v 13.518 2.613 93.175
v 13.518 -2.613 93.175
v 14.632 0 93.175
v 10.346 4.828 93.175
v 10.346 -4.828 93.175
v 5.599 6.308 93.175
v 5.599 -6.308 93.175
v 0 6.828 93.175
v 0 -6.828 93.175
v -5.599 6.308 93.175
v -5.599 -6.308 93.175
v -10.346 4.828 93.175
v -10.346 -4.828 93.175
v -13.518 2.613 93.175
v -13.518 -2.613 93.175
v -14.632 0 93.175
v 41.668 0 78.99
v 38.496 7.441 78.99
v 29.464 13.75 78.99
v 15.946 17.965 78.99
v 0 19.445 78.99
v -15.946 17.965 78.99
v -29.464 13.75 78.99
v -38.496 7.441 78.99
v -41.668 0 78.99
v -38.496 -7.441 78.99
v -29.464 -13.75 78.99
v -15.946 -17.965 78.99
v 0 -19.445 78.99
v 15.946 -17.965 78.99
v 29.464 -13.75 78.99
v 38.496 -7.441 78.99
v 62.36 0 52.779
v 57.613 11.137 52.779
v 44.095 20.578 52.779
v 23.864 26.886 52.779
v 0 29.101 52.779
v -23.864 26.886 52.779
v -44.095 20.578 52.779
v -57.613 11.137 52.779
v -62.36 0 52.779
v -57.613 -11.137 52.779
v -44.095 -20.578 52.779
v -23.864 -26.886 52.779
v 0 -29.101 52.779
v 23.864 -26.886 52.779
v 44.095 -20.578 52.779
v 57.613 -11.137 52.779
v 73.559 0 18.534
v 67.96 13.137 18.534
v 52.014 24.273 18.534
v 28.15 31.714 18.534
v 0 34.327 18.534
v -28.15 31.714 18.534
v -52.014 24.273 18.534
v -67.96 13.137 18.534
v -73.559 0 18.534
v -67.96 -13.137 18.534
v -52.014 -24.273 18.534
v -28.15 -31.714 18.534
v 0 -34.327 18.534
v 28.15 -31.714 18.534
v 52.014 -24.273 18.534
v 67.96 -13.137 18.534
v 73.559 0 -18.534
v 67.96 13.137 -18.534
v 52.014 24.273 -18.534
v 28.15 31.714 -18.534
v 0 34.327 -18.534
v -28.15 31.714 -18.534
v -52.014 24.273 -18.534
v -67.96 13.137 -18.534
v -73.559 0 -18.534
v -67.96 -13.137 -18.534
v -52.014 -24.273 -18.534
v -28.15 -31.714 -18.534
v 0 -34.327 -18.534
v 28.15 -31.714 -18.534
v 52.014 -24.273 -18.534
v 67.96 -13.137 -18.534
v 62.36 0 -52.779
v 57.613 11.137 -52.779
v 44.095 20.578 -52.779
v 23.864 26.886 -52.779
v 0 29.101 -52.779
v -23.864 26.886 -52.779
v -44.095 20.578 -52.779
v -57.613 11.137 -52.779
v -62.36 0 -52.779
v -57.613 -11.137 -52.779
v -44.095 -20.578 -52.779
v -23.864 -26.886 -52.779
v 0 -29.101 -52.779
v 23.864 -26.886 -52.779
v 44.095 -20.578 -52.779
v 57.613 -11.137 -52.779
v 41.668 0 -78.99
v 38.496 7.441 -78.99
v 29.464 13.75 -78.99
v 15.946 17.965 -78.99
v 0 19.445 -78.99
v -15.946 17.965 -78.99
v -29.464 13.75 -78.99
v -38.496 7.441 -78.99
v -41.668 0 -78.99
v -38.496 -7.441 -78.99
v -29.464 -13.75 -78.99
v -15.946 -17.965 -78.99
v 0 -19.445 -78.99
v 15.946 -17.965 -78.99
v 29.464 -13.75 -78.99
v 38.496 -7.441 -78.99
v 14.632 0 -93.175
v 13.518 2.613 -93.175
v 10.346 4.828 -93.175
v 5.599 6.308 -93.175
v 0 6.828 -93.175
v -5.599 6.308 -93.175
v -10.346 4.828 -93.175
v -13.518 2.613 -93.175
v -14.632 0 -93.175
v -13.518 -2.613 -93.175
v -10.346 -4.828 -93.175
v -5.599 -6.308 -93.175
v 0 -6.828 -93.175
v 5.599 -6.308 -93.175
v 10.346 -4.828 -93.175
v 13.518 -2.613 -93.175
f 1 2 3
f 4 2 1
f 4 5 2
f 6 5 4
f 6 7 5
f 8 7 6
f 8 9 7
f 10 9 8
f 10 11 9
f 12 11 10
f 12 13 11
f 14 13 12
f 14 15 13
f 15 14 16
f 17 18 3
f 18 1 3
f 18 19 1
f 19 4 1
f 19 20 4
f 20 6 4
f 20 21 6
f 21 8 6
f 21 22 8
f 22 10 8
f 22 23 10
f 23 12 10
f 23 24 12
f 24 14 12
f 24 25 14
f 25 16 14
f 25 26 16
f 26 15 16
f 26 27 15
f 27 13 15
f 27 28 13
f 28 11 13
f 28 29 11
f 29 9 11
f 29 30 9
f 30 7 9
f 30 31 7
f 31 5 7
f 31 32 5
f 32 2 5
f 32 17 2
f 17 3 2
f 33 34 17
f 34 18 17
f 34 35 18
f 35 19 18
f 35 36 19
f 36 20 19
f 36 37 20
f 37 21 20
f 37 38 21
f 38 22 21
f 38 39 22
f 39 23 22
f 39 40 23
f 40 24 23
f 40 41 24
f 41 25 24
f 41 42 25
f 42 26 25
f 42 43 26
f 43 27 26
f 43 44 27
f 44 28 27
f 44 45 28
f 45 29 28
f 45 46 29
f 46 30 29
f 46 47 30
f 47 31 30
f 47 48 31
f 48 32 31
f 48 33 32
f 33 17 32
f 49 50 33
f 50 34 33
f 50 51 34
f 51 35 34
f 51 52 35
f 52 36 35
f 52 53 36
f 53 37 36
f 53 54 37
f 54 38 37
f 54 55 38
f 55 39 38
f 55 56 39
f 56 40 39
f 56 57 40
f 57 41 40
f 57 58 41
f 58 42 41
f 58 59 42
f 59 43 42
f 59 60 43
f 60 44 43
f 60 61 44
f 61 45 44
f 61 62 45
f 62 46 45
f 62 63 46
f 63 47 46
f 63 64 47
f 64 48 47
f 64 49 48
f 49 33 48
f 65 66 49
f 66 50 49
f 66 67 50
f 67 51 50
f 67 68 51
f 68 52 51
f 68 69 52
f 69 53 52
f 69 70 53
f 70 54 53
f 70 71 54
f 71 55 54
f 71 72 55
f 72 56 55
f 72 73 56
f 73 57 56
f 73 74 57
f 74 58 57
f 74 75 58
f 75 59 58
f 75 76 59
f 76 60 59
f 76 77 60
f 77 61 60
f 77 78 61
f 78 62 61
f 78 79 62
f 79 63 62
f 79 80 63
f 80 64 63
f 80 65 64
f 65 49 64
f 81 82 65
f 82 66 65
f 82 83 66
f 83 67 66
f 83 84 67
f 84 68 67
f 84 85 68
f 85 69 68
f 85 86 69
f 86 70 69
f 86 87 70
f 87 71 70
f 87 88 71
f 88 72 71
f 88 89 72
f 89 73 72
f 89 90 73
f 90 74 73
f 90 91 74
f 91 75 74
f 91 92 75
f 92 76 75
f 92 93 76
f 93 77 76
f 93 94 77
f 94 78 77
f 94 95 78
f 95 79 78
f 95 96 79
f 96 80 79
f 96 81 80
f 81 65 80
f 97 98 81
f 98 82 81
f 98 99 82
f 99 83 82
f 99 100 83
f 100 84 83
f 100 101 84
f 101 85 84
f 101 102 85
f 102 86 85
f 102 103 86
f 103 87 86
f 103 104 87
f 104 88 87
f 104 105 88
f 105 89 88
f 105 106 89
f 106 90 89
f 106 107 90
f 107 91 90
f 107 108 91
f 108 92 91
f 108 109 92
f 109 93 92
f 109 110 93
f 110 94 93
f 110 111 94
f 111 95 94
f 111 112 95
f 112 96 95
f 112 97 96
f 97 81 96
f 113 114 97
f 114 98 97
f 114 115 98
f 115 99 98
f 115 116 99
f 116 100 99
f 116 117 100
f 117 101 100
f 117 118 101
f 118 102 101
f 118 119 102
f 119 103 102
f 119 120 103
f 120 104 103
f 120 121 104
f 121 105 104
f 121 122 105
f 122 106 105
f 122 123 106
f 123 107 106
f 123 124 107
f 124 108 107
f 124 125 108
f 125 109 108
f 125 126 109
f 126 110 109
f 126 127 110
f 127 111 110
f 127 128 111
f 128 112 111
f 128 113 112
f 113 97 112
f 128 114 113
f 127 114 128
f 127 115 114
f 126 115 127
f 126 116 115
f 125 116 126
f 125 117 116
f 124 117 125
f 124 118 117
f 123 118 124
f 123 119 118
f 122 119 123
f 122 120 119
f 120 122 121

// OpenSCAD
// Generated by SolidPython 1.0.1 on 2020-07-29 00:46:51


scale(v = [15, 7, 19]) {
	sphere(r = 5);
}
/***********************************************
*********      SolidPython code:      **********
************************************************
 
# import packages: SolidPython
from solid import *
from solid.utils import *
from itertools import chain, combinations, permutations


class Resize:

    def __init__(self, scad_file):
        self.scad_file = scad_file
        #self.scad_file = import_scad(scad_file)
        # cone/cylinder param:
        self.r1 = 0
        self.r2 = 0
        self.h = 0
        # rectangular prism param:
        self.w = 0
        self.l = 0
        # ellipse param:
        self.r = 0

    # import OpenScad code (file name corresponds to shape)


    # classify shape + parameters
    def assign(self, param1, param2, param3):
        if self.scad_file == 'cone.scad':
            self.r1 = param1
            self.r2 = param2
            self.h = param3
        elif self.scad_file == 'cylinder.scad':
            self.r1 = param1
            self.r2 = param2
            self.h = param3
        elif self.scad_file == 'rectangularPrism.scad':
            self.h = param1
            self.l = param2
            self.w = param3
        else:
            self.r = param1
            self.h = param2

    # resize parameters
    def iterate(self):
        x = range(3, 20, 2)
        i = 1
        if self.scad_file == 'cone.scad':
            tempList = list(permutations(x, 2))
            for temp in tempList:
                param1 = temp[0]
                param2 = temp[1]
                filepath = 'produced_scad_files/' + 'cone' + str(param1) + '_' + str(param2) + '_' + '.scad'
                scad_render_to_file(cylinder(h=param1, r1=param2, r2=0), filepath)

        elif self.scad_file == 'cylinder.scad':
            tempList = list(permutations(x, 3))
            for temp in tempList:
                param1 = temp[0]
                param2 = temp[1]
                filepath = 'produced_scad_files/' + 'cylinder' + str(param1) + '_' + str(param2) + '_' + '.scad'
                scad_render_to_file(cylinder(h=param1, r1=param2, r2=param2), filepath)

        elif self.scad_file == 'rectangularPrism.scad':
            tempList = list(permutations(x, 3))
            for temp in tempList:
                param1 = temp[0]
                param2 = temp[1]
                param3 = temp[2]
                filepath = 'produced_scad_files/' + 'rectangularPrism' + str(param1) + '_' + str(param2) + '_' + str(
                    param3) + '.scad'
                scad_render_to_file(cube(size=(param1, param2, param3)), filepath)

        elif self.scad_file == 'ellipse.scad':
            tempList = list(permutations(x, 4))
            for temp in tempList:
                param1 = temp[0]
                param2 = temp[1]
                param3 = temp[2]
                param4 = temp[3]
                filepath = 'produced_scad_files/' + 'ellipse' + str(param1) + '_' + str(param2) + '_' + str(param3) + '_' + str(param4) + '.scad'
                scad_render_to_file(scale([param1, param2, param3])(sphere(r=param4)), filepath)

    def render_to_scadfile(self):
        scad_render_to_file(scad, 'example.scad') 
 
************************************************/
